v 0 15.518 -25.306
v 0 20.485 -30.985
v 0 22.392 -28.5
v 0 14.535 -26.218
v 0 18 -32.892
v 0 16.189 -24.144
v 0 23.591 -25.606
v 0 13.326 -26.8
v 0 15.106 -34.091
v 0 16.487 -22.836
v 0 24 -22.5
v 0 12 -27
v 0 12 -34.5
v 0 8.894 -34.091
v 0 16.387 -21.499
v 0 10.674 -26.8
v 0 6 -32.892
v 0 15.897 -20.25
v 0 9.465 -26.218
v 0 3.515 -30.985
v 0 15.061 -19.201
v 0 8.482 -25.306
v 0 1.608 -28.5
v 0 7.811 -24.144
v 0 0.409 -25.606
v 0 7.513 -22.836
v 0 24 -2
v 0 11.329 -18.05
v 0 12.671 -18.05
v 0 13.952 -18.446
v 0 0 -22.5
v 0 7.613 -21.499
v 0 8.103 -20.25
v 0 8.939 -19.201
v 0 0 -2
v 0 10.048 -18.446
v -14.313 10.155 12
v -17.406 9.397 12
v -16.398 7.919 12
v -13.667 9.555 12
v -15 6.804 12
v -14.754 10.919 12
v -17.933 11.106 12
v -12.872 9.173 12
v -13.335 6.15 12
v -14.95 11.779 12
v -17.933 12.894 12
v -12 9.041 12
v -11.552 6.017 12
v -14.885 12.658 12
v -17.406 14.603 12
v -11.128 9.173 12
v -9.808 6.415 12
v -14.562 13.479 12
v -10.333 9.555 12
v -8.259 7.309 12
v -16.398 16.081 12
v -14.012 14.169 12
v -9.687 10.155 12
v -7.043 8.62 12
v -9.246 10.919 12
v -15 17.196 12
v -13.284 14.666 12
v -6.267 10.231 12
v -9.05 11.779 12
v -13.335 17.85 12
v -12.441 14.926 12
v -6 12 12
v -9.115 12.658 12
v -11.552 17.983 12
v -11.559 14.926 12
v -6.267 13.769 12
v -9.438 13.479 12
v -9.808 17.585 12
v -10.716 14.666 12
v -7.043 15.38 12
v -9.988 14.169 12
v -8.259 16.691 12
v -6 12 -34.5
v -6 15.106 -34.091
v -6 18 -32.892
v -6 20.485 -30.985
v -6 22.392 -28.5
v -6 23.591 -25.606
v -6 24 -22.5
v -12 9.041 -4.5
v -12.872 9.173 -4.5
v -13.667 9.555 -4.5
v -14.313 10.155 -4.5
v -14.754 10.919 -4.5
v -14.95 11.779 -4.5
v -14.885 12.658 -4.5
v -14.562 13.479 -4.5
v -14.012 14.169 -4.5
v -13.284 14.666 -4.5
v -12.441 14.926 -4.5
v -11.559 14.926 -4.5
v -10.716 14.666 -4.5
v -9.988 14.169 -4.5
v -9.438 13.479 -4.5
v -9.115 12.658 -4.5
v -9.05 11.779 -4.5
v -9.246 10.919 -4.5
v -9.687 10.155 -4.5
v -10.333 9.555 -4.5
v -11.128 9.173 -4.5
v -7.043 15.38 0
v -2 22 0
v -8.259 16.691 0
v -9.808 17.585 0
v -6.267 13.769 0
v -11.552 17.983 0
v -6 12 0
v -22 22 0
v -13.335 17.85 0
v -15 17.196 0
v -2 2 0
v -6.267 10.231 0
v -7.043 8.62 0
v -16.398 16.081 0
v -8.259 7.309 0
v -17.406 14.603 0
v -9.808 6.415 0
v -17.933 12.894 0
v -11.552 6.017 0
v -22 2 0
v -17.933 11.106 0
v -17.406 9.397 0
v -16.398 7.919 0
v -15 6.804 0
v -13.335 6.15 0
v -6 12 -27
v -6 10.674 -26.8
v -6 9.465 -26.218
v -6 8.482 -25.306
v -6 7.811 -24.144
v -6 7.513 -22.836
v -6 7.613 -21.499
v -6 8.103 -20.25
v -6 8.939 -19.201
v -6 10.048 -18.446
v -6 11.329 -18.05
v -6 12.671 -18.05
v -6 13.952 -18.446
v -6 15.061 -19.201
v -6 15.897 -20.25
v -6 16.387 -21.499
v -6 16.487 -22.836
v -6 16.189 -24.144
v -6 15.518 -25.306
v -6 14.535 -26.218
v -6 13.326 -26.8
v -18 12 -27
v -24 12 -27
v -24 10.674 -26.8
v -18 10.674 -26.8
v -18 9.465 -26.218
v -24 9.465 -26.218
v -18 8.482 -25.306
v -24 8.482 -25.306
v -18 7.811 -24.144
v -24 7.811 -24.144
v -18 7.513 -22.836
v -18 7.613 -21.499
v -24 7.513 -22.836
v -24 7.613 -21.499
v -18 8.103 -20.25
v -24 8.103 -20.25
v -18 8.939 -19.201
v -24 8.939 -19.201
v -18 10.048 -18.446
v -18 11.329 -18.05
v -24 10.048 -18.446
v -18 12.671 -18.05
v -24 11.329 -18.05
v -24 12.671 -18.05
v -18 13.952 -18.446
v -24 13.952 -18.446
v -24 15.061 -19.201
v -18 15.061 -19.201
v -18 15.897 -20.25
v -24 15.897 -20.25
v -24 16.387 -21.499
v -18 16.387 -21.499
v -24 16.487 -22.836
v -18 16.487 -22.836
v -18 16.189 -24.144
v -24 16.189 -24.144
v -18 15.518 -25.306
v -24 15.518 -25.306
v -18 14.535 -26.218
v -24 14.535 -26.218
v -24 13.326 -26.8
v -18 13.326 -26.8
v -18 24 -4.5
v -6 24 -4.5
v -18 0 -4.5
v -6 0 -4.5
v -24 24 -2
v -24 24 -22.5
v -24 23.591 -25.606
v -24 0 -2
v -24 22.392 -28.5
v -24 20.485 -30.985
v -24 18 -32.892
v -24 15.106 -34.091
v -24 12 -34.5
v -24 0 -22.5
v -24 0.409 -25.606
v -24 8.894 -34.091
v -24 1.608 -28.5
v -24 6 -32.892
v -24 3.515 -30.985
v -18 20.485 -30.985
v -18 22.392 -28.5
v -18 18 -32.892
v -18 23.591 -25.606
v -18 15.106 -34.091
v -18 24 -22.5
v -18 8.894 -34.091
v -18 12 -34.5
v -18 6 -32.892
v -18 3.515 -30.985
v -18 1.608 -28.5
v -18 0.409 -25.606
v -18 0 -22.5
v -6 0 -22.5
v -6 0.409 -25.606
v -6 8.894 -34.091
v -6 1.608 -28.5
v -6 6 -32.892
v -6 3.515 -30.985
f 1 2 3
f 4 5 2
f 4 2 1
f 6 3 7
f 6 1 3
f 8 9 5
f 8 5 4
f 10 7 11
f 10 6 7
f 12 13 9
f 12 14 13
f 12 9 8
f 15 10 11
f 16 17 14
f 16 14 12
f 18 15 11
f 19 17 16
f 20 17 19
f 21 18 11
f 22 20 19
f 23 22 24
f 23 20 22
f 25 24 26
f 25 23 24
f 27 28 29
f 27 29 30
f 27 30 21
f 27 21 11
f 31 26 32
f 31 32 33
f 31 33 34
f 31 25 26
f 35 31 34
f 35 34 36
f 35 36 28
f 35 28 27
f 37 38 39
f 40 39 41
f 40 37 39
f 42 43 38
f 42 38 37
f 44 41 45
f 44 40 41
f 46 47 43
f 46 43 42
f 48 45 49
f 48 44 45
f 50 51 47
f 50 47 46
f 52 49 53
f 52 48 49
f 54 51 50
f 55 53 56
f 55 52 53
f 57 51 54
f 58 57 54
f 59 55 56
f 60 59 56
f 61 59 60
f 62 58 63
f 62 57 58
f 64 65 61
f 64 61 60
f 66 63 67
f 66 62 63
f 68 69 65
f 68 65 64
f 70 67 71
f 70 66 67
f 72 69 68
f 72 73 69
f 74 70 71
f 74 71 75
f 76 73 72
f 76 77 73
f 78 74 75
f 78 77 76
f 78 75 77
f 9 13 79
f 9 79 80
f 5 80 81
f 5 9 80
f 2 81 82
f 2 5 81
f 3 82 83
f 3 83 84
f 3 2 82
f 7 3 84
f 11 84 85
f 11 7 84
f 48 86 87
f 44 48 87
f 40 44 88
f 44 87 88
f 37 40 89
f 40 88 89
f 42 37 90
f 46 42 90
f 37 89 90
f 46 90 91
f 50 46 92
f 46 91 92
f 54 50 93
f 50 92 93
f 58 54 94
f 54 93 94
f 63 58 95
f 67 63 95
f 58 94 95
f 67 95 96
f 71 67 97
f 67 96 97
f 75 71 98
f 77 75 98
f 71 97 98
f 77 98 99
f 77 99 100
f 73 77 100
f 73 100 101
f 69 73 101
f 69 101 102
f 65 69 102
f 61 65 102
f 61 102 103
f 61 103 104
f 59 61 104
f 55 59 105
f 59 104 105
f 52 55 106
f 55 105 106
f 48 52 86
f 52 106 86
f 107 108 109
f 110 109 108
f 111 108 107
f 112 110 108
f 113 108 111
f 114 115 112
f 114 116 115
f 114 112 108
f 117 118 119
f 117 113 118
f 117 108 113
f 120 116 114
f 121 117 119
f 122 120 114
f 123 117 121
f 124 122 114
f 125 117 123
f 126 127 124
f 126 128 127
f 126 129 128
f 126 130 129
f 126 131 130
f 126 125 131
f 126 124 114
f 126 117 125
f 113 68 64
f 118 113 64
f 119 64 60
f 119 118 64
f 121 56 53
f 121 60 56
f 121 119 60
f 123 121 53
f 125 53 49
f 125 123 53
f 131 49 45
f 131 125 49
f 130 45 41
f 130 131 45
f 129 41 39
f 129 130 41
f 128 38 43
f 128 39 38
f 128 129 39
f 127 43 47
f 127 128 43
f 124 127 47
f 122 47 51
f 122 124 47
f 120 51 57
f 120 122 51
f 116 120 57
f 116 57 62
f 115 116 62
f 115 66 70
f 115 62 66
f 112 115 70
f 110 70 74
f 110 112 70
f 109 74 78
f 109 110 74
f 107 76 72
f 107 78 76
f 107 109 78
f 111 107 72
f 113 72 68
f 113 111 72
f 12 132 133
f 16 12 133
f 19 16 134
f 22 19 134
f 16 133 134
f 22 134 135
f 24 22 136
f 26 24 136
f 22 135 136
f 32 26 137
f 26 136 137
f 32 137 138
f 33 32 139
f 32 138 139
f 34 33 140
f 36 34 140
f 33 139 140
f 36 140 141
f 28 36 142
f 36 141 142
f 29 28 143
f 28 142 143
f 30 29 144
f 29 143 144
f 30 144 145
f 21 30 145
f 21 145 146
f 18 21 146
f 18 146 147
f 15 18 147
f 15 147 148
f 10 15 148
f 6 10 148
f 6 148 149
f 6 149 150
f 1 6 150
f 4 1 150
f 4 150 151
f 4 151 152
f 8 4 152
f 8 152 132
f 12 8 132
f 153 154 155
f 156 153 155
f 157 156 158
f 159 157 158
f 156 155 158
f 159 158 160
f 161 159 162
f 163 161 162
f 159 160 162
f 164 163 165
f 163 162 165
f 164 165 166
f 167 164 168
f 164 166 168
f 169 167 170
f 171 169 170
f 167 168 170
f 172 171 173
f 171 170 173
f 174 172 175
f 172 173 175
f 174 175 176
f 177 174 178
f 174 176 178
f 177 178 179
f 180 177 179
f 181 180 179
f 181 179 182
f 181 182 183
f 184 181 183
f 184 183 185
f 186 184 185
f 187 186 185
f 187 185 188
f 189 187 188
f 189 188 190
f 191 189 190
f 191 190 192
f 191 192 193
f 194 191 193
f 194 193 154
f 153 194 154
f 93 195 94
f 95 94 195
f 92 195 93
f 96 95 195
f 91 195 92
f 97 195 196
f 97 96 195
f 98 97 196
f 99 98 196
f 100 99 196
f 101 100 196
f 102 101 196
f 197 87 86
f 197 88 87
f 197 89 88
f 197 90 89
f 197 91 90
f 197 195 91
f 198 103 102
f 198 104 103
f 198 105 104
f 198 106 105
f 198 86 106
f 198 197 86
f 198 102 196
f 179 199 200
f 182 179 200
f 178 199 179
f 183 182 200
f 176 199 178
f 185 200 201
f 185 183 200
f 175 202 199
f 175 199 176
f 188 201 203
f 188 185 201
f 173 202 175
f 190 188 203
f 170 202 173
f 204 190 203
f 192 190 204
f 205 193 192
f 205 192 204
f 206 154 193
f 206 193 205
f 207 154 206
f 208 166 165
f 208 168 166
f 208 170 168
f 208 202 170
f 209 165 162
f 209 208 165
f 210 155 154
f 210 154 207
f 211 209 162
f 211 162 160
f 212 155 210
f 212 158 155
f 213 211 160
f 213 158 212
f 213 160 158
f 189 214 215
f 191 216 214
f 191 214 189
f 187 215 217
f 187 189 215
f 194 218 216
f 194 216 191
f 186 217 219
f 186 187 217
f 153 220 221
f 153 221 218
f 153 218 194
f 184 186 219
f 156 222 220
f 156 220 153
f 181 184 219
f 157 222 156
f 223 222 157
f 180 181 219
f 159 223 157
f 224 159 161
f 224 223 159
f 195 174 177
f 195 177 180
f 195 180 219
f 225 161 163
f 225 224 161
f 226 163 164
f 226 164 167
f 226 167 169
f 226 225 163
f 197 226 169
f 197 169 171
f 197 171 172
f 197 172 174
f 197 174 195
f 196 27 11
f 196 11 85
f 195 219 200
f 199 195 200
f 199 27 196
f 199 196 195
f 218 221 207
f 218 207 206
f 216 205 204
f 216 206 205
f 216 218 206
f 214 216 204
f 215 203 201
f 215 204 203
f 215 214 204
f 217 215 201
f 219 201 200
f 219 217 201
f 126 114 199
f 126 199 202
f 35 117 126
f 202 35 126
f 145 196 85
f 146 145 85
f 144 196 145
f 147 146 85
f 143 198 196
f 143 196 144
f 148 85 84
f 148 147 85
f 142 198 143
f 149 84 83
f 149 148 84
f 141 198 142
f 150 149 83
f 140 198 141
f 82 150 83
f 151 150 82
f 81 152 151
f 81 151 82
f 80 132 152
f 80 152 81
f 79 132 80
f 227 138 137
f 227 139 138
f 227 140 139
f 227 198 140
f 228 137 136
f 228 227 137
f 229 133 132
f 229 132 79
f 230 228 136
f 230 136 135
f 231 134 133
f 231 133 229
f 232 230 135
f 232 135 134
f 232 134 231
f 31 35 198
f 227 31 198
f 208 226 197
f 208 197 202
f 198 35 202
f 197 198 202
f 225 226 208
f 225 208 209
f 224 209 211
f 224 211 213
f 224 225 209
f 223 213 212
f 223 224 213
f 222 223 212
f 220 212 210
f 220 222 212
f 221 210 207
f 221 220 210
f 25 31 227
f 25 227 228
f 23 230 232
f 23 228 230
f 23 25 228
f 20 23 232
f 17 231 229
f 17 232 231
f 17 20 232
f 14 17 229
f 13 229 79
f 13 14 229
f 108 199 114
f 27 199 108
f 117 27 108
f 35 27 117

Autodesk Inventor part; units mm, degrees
ref_plane "YZ Plane" through (0, 0, 0) normal (1, 0, 0) x (0, 1, 0)
ref_plane "XZ Plane" through (0, 0, 0) normal (0, 1, 0) x (-1, 0, 0)
ref_plane "XY Plane" through (0, 0, 0) normal (0, 0, 1) x (1, 0, 0)
sketch "Skizze1" plane through (0, 0, 0) normal (0, 1, 0) x (-1, 0, 0)
  line L0 (0, 0) -> (24, 0)
  line L1 (24, 0) -> (24, -34.5)
  line L2 (24, -34.5) -> (18, -34.5)
  line L3 (18, -34.5) -> (18, -4.5)
  line L4 (18, -4.5) -> (6, -4.5)
  line L5 (6, -4.5) -> (6, -34.5)
  line L6 (6, -34.5) -> (0, -34.5)
  line L7 (0, -34.5) -> (0, 0)
  dimension "d0" = 6
  dimension "d1" = 6
  dimension "d2" = 12
  dimension "d3" = 30
  dimension "d4" = 4.5
extrude "Extrusion1" add sketch "Skizze1" along normal blind 24
fillet "Rundung1" radius 12 2 edges at (-3, 24, -34.5) (-3, 0, -34.5)
fillet "Rundung2" radius 12 2 edges at (-21, 0, -34.5) (-21, 24, -34.5)
sketch "Skizze2" plane through (0, 0, 0) normal (1, 0, 0) x (0, 0, -1)
  arc A0 (22.5, 0) -> (22.5, 24) centre (22.5, 12) ccw projected
  point P0 (0, 0)
hole "Bohrung1" at (0, 12, -22.5) direction (-1, 0, 0) diameter 9 depth 24
chamfer "Fasen1" distance 2 angle 45 4 edges at (-12, 24, 0) (0, 12, 0) (-12, 0, 0) (-24, 12, 0)
sketch "Skizze3" plane through (-22, 2, 0) normal (0, 0, 1) x (1, 0, 0)
  circle A0 centre (10, 10) radius 6
  line L0 (-2, 22) -> (-2, -2) projected
  line L1 (0, 20) -> (20, 20) projected
  point P0 (22, -2)
  point P1 (-2, 10)
  point P2 (10, 20)
  dimension "d19" = 12
extrude "Extrusion2" add sketch "Skizze3" along normal blind 12
sketch "Skizze4" plane through (-12, 12, 12) normal (0, 0, 1) x (1, 0, 0)
  circle A0 centre (0, 0) radius 6 projected
  point P0 (12, -12)
hole "Bohrung2" at (-12, 12, 12) direction (0, 0, -1) diameter 5.9175 depth 16.5 tip angle 118 thread size "M7x1" class "6H" standard "ISO Metric profile"
properties part number "top_cylinder" material "Glasfaserbeton"
